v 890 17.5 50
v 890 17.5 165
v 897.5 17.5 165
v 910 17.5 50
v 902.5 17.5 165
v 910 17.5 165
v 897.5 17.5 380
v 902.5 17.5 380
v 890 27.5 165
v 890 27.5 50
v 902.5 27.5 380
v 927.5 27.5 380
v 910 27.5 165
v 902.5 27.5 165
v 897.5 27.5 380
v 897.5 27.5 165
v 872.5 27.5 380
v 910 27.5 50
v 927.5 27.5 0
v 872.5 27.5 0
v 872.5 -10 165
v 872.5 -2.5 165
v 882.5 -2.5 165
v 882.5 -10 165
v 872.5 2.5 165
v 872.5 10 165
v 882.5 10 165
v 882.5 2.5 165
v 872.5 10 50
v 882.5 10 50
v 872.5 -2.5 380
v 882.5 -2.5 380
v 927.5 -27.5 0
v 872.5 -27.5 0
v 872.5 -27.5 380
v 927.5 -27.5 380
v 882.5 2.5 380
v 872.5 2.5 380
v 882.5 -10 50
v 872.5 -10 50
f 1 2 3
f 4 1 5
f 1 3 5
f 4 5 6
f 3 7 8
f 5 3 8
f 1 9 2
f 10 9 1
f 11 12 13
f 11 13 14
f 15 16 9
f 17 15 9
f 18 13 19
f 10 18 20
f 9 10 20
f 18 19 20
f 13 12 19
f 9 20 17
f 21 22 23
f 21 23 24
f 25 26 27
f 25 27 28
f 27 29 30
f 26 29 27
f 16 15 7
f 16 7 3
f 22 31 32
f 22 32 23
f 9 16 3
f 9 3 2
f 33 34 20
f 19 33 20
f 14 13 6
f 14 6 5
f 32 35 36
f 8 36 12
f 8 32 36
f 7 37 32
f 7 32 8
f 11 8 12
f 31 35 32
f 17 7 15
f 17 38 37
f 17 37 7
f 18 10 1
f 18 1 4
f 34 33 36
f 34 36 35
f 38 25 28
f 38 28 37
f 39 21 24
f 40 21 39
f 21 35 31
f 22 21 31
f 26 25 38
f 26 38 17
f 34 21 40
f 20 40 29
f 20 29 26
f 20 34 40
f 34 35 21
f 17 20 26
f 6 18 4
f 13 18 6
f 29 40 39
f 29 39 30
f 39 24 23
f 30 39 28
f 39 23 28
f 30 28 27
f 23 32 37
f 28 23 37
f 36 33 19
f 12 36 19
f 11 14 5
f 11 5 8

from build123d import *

# Parameters (mm, degrees)
SKETCH_W                = 55
SKETCH_H                = 55
PAD_DEPTH               = 380
POCKET_DEPTH            = 10
POLARPATTERN_COUNT      = 2
POLARPATTERN_ANGLE      = 90
BODY001_PLACEMENT_ANGLE = 90


with BuildPart() as part:
    # Sketch → Pad (new body)
    with BuildSketch(Plane.XY):
        Rectangle(SKETCH_W, SKETCH_H)
    extrude(amount=PAD_DEPTH)

    # Sketch001 (on DatumPlane) → Pocket (cut)
    with BuildSketch(Plane.YZ.offset(27.5)):
        Polygon((-10, 165), (-2.5, 165), (-2.5, 510), (2.5, 510), (2.5, 165), (10, 165), (10, 50), (-10, 50), align=None)
    pocket = extrude(amount=-POCKET_DEPTH, mode=Mode.SUBTRACT)

    # PolarPattern: Pocket ×2 about axis
    polarpattern_axis = Axis((0, 0, 0), (0, 0, 1))
    for i in range(1, POLARPATTERN_COUNT):
        add(pocket.rotate(polarpattern_axis, i * POLARPATTERN_ANGLE / (POLARPATTERN_COUNT - 1)), mode=Mode.SUBTRACT)


with BuildPart() as part_1:
    # Body placement: moved
    add(part.part.moved(Location((-10, 0, 0))))


with BuildPart() as part_2:
    # Clone placement: moved
    add(part_1.part.moved(Location((10, 0, 0))))


with BuildPart() as part_3:
    # Body001 placement: moved
    add(part_2.part.moved(Location((900, 0, 0))).rotate(Axis((900, 0, 0), (0, 0, 1)), BODY001_PLACEMENT_ANGLE))


solid = part_3.part
